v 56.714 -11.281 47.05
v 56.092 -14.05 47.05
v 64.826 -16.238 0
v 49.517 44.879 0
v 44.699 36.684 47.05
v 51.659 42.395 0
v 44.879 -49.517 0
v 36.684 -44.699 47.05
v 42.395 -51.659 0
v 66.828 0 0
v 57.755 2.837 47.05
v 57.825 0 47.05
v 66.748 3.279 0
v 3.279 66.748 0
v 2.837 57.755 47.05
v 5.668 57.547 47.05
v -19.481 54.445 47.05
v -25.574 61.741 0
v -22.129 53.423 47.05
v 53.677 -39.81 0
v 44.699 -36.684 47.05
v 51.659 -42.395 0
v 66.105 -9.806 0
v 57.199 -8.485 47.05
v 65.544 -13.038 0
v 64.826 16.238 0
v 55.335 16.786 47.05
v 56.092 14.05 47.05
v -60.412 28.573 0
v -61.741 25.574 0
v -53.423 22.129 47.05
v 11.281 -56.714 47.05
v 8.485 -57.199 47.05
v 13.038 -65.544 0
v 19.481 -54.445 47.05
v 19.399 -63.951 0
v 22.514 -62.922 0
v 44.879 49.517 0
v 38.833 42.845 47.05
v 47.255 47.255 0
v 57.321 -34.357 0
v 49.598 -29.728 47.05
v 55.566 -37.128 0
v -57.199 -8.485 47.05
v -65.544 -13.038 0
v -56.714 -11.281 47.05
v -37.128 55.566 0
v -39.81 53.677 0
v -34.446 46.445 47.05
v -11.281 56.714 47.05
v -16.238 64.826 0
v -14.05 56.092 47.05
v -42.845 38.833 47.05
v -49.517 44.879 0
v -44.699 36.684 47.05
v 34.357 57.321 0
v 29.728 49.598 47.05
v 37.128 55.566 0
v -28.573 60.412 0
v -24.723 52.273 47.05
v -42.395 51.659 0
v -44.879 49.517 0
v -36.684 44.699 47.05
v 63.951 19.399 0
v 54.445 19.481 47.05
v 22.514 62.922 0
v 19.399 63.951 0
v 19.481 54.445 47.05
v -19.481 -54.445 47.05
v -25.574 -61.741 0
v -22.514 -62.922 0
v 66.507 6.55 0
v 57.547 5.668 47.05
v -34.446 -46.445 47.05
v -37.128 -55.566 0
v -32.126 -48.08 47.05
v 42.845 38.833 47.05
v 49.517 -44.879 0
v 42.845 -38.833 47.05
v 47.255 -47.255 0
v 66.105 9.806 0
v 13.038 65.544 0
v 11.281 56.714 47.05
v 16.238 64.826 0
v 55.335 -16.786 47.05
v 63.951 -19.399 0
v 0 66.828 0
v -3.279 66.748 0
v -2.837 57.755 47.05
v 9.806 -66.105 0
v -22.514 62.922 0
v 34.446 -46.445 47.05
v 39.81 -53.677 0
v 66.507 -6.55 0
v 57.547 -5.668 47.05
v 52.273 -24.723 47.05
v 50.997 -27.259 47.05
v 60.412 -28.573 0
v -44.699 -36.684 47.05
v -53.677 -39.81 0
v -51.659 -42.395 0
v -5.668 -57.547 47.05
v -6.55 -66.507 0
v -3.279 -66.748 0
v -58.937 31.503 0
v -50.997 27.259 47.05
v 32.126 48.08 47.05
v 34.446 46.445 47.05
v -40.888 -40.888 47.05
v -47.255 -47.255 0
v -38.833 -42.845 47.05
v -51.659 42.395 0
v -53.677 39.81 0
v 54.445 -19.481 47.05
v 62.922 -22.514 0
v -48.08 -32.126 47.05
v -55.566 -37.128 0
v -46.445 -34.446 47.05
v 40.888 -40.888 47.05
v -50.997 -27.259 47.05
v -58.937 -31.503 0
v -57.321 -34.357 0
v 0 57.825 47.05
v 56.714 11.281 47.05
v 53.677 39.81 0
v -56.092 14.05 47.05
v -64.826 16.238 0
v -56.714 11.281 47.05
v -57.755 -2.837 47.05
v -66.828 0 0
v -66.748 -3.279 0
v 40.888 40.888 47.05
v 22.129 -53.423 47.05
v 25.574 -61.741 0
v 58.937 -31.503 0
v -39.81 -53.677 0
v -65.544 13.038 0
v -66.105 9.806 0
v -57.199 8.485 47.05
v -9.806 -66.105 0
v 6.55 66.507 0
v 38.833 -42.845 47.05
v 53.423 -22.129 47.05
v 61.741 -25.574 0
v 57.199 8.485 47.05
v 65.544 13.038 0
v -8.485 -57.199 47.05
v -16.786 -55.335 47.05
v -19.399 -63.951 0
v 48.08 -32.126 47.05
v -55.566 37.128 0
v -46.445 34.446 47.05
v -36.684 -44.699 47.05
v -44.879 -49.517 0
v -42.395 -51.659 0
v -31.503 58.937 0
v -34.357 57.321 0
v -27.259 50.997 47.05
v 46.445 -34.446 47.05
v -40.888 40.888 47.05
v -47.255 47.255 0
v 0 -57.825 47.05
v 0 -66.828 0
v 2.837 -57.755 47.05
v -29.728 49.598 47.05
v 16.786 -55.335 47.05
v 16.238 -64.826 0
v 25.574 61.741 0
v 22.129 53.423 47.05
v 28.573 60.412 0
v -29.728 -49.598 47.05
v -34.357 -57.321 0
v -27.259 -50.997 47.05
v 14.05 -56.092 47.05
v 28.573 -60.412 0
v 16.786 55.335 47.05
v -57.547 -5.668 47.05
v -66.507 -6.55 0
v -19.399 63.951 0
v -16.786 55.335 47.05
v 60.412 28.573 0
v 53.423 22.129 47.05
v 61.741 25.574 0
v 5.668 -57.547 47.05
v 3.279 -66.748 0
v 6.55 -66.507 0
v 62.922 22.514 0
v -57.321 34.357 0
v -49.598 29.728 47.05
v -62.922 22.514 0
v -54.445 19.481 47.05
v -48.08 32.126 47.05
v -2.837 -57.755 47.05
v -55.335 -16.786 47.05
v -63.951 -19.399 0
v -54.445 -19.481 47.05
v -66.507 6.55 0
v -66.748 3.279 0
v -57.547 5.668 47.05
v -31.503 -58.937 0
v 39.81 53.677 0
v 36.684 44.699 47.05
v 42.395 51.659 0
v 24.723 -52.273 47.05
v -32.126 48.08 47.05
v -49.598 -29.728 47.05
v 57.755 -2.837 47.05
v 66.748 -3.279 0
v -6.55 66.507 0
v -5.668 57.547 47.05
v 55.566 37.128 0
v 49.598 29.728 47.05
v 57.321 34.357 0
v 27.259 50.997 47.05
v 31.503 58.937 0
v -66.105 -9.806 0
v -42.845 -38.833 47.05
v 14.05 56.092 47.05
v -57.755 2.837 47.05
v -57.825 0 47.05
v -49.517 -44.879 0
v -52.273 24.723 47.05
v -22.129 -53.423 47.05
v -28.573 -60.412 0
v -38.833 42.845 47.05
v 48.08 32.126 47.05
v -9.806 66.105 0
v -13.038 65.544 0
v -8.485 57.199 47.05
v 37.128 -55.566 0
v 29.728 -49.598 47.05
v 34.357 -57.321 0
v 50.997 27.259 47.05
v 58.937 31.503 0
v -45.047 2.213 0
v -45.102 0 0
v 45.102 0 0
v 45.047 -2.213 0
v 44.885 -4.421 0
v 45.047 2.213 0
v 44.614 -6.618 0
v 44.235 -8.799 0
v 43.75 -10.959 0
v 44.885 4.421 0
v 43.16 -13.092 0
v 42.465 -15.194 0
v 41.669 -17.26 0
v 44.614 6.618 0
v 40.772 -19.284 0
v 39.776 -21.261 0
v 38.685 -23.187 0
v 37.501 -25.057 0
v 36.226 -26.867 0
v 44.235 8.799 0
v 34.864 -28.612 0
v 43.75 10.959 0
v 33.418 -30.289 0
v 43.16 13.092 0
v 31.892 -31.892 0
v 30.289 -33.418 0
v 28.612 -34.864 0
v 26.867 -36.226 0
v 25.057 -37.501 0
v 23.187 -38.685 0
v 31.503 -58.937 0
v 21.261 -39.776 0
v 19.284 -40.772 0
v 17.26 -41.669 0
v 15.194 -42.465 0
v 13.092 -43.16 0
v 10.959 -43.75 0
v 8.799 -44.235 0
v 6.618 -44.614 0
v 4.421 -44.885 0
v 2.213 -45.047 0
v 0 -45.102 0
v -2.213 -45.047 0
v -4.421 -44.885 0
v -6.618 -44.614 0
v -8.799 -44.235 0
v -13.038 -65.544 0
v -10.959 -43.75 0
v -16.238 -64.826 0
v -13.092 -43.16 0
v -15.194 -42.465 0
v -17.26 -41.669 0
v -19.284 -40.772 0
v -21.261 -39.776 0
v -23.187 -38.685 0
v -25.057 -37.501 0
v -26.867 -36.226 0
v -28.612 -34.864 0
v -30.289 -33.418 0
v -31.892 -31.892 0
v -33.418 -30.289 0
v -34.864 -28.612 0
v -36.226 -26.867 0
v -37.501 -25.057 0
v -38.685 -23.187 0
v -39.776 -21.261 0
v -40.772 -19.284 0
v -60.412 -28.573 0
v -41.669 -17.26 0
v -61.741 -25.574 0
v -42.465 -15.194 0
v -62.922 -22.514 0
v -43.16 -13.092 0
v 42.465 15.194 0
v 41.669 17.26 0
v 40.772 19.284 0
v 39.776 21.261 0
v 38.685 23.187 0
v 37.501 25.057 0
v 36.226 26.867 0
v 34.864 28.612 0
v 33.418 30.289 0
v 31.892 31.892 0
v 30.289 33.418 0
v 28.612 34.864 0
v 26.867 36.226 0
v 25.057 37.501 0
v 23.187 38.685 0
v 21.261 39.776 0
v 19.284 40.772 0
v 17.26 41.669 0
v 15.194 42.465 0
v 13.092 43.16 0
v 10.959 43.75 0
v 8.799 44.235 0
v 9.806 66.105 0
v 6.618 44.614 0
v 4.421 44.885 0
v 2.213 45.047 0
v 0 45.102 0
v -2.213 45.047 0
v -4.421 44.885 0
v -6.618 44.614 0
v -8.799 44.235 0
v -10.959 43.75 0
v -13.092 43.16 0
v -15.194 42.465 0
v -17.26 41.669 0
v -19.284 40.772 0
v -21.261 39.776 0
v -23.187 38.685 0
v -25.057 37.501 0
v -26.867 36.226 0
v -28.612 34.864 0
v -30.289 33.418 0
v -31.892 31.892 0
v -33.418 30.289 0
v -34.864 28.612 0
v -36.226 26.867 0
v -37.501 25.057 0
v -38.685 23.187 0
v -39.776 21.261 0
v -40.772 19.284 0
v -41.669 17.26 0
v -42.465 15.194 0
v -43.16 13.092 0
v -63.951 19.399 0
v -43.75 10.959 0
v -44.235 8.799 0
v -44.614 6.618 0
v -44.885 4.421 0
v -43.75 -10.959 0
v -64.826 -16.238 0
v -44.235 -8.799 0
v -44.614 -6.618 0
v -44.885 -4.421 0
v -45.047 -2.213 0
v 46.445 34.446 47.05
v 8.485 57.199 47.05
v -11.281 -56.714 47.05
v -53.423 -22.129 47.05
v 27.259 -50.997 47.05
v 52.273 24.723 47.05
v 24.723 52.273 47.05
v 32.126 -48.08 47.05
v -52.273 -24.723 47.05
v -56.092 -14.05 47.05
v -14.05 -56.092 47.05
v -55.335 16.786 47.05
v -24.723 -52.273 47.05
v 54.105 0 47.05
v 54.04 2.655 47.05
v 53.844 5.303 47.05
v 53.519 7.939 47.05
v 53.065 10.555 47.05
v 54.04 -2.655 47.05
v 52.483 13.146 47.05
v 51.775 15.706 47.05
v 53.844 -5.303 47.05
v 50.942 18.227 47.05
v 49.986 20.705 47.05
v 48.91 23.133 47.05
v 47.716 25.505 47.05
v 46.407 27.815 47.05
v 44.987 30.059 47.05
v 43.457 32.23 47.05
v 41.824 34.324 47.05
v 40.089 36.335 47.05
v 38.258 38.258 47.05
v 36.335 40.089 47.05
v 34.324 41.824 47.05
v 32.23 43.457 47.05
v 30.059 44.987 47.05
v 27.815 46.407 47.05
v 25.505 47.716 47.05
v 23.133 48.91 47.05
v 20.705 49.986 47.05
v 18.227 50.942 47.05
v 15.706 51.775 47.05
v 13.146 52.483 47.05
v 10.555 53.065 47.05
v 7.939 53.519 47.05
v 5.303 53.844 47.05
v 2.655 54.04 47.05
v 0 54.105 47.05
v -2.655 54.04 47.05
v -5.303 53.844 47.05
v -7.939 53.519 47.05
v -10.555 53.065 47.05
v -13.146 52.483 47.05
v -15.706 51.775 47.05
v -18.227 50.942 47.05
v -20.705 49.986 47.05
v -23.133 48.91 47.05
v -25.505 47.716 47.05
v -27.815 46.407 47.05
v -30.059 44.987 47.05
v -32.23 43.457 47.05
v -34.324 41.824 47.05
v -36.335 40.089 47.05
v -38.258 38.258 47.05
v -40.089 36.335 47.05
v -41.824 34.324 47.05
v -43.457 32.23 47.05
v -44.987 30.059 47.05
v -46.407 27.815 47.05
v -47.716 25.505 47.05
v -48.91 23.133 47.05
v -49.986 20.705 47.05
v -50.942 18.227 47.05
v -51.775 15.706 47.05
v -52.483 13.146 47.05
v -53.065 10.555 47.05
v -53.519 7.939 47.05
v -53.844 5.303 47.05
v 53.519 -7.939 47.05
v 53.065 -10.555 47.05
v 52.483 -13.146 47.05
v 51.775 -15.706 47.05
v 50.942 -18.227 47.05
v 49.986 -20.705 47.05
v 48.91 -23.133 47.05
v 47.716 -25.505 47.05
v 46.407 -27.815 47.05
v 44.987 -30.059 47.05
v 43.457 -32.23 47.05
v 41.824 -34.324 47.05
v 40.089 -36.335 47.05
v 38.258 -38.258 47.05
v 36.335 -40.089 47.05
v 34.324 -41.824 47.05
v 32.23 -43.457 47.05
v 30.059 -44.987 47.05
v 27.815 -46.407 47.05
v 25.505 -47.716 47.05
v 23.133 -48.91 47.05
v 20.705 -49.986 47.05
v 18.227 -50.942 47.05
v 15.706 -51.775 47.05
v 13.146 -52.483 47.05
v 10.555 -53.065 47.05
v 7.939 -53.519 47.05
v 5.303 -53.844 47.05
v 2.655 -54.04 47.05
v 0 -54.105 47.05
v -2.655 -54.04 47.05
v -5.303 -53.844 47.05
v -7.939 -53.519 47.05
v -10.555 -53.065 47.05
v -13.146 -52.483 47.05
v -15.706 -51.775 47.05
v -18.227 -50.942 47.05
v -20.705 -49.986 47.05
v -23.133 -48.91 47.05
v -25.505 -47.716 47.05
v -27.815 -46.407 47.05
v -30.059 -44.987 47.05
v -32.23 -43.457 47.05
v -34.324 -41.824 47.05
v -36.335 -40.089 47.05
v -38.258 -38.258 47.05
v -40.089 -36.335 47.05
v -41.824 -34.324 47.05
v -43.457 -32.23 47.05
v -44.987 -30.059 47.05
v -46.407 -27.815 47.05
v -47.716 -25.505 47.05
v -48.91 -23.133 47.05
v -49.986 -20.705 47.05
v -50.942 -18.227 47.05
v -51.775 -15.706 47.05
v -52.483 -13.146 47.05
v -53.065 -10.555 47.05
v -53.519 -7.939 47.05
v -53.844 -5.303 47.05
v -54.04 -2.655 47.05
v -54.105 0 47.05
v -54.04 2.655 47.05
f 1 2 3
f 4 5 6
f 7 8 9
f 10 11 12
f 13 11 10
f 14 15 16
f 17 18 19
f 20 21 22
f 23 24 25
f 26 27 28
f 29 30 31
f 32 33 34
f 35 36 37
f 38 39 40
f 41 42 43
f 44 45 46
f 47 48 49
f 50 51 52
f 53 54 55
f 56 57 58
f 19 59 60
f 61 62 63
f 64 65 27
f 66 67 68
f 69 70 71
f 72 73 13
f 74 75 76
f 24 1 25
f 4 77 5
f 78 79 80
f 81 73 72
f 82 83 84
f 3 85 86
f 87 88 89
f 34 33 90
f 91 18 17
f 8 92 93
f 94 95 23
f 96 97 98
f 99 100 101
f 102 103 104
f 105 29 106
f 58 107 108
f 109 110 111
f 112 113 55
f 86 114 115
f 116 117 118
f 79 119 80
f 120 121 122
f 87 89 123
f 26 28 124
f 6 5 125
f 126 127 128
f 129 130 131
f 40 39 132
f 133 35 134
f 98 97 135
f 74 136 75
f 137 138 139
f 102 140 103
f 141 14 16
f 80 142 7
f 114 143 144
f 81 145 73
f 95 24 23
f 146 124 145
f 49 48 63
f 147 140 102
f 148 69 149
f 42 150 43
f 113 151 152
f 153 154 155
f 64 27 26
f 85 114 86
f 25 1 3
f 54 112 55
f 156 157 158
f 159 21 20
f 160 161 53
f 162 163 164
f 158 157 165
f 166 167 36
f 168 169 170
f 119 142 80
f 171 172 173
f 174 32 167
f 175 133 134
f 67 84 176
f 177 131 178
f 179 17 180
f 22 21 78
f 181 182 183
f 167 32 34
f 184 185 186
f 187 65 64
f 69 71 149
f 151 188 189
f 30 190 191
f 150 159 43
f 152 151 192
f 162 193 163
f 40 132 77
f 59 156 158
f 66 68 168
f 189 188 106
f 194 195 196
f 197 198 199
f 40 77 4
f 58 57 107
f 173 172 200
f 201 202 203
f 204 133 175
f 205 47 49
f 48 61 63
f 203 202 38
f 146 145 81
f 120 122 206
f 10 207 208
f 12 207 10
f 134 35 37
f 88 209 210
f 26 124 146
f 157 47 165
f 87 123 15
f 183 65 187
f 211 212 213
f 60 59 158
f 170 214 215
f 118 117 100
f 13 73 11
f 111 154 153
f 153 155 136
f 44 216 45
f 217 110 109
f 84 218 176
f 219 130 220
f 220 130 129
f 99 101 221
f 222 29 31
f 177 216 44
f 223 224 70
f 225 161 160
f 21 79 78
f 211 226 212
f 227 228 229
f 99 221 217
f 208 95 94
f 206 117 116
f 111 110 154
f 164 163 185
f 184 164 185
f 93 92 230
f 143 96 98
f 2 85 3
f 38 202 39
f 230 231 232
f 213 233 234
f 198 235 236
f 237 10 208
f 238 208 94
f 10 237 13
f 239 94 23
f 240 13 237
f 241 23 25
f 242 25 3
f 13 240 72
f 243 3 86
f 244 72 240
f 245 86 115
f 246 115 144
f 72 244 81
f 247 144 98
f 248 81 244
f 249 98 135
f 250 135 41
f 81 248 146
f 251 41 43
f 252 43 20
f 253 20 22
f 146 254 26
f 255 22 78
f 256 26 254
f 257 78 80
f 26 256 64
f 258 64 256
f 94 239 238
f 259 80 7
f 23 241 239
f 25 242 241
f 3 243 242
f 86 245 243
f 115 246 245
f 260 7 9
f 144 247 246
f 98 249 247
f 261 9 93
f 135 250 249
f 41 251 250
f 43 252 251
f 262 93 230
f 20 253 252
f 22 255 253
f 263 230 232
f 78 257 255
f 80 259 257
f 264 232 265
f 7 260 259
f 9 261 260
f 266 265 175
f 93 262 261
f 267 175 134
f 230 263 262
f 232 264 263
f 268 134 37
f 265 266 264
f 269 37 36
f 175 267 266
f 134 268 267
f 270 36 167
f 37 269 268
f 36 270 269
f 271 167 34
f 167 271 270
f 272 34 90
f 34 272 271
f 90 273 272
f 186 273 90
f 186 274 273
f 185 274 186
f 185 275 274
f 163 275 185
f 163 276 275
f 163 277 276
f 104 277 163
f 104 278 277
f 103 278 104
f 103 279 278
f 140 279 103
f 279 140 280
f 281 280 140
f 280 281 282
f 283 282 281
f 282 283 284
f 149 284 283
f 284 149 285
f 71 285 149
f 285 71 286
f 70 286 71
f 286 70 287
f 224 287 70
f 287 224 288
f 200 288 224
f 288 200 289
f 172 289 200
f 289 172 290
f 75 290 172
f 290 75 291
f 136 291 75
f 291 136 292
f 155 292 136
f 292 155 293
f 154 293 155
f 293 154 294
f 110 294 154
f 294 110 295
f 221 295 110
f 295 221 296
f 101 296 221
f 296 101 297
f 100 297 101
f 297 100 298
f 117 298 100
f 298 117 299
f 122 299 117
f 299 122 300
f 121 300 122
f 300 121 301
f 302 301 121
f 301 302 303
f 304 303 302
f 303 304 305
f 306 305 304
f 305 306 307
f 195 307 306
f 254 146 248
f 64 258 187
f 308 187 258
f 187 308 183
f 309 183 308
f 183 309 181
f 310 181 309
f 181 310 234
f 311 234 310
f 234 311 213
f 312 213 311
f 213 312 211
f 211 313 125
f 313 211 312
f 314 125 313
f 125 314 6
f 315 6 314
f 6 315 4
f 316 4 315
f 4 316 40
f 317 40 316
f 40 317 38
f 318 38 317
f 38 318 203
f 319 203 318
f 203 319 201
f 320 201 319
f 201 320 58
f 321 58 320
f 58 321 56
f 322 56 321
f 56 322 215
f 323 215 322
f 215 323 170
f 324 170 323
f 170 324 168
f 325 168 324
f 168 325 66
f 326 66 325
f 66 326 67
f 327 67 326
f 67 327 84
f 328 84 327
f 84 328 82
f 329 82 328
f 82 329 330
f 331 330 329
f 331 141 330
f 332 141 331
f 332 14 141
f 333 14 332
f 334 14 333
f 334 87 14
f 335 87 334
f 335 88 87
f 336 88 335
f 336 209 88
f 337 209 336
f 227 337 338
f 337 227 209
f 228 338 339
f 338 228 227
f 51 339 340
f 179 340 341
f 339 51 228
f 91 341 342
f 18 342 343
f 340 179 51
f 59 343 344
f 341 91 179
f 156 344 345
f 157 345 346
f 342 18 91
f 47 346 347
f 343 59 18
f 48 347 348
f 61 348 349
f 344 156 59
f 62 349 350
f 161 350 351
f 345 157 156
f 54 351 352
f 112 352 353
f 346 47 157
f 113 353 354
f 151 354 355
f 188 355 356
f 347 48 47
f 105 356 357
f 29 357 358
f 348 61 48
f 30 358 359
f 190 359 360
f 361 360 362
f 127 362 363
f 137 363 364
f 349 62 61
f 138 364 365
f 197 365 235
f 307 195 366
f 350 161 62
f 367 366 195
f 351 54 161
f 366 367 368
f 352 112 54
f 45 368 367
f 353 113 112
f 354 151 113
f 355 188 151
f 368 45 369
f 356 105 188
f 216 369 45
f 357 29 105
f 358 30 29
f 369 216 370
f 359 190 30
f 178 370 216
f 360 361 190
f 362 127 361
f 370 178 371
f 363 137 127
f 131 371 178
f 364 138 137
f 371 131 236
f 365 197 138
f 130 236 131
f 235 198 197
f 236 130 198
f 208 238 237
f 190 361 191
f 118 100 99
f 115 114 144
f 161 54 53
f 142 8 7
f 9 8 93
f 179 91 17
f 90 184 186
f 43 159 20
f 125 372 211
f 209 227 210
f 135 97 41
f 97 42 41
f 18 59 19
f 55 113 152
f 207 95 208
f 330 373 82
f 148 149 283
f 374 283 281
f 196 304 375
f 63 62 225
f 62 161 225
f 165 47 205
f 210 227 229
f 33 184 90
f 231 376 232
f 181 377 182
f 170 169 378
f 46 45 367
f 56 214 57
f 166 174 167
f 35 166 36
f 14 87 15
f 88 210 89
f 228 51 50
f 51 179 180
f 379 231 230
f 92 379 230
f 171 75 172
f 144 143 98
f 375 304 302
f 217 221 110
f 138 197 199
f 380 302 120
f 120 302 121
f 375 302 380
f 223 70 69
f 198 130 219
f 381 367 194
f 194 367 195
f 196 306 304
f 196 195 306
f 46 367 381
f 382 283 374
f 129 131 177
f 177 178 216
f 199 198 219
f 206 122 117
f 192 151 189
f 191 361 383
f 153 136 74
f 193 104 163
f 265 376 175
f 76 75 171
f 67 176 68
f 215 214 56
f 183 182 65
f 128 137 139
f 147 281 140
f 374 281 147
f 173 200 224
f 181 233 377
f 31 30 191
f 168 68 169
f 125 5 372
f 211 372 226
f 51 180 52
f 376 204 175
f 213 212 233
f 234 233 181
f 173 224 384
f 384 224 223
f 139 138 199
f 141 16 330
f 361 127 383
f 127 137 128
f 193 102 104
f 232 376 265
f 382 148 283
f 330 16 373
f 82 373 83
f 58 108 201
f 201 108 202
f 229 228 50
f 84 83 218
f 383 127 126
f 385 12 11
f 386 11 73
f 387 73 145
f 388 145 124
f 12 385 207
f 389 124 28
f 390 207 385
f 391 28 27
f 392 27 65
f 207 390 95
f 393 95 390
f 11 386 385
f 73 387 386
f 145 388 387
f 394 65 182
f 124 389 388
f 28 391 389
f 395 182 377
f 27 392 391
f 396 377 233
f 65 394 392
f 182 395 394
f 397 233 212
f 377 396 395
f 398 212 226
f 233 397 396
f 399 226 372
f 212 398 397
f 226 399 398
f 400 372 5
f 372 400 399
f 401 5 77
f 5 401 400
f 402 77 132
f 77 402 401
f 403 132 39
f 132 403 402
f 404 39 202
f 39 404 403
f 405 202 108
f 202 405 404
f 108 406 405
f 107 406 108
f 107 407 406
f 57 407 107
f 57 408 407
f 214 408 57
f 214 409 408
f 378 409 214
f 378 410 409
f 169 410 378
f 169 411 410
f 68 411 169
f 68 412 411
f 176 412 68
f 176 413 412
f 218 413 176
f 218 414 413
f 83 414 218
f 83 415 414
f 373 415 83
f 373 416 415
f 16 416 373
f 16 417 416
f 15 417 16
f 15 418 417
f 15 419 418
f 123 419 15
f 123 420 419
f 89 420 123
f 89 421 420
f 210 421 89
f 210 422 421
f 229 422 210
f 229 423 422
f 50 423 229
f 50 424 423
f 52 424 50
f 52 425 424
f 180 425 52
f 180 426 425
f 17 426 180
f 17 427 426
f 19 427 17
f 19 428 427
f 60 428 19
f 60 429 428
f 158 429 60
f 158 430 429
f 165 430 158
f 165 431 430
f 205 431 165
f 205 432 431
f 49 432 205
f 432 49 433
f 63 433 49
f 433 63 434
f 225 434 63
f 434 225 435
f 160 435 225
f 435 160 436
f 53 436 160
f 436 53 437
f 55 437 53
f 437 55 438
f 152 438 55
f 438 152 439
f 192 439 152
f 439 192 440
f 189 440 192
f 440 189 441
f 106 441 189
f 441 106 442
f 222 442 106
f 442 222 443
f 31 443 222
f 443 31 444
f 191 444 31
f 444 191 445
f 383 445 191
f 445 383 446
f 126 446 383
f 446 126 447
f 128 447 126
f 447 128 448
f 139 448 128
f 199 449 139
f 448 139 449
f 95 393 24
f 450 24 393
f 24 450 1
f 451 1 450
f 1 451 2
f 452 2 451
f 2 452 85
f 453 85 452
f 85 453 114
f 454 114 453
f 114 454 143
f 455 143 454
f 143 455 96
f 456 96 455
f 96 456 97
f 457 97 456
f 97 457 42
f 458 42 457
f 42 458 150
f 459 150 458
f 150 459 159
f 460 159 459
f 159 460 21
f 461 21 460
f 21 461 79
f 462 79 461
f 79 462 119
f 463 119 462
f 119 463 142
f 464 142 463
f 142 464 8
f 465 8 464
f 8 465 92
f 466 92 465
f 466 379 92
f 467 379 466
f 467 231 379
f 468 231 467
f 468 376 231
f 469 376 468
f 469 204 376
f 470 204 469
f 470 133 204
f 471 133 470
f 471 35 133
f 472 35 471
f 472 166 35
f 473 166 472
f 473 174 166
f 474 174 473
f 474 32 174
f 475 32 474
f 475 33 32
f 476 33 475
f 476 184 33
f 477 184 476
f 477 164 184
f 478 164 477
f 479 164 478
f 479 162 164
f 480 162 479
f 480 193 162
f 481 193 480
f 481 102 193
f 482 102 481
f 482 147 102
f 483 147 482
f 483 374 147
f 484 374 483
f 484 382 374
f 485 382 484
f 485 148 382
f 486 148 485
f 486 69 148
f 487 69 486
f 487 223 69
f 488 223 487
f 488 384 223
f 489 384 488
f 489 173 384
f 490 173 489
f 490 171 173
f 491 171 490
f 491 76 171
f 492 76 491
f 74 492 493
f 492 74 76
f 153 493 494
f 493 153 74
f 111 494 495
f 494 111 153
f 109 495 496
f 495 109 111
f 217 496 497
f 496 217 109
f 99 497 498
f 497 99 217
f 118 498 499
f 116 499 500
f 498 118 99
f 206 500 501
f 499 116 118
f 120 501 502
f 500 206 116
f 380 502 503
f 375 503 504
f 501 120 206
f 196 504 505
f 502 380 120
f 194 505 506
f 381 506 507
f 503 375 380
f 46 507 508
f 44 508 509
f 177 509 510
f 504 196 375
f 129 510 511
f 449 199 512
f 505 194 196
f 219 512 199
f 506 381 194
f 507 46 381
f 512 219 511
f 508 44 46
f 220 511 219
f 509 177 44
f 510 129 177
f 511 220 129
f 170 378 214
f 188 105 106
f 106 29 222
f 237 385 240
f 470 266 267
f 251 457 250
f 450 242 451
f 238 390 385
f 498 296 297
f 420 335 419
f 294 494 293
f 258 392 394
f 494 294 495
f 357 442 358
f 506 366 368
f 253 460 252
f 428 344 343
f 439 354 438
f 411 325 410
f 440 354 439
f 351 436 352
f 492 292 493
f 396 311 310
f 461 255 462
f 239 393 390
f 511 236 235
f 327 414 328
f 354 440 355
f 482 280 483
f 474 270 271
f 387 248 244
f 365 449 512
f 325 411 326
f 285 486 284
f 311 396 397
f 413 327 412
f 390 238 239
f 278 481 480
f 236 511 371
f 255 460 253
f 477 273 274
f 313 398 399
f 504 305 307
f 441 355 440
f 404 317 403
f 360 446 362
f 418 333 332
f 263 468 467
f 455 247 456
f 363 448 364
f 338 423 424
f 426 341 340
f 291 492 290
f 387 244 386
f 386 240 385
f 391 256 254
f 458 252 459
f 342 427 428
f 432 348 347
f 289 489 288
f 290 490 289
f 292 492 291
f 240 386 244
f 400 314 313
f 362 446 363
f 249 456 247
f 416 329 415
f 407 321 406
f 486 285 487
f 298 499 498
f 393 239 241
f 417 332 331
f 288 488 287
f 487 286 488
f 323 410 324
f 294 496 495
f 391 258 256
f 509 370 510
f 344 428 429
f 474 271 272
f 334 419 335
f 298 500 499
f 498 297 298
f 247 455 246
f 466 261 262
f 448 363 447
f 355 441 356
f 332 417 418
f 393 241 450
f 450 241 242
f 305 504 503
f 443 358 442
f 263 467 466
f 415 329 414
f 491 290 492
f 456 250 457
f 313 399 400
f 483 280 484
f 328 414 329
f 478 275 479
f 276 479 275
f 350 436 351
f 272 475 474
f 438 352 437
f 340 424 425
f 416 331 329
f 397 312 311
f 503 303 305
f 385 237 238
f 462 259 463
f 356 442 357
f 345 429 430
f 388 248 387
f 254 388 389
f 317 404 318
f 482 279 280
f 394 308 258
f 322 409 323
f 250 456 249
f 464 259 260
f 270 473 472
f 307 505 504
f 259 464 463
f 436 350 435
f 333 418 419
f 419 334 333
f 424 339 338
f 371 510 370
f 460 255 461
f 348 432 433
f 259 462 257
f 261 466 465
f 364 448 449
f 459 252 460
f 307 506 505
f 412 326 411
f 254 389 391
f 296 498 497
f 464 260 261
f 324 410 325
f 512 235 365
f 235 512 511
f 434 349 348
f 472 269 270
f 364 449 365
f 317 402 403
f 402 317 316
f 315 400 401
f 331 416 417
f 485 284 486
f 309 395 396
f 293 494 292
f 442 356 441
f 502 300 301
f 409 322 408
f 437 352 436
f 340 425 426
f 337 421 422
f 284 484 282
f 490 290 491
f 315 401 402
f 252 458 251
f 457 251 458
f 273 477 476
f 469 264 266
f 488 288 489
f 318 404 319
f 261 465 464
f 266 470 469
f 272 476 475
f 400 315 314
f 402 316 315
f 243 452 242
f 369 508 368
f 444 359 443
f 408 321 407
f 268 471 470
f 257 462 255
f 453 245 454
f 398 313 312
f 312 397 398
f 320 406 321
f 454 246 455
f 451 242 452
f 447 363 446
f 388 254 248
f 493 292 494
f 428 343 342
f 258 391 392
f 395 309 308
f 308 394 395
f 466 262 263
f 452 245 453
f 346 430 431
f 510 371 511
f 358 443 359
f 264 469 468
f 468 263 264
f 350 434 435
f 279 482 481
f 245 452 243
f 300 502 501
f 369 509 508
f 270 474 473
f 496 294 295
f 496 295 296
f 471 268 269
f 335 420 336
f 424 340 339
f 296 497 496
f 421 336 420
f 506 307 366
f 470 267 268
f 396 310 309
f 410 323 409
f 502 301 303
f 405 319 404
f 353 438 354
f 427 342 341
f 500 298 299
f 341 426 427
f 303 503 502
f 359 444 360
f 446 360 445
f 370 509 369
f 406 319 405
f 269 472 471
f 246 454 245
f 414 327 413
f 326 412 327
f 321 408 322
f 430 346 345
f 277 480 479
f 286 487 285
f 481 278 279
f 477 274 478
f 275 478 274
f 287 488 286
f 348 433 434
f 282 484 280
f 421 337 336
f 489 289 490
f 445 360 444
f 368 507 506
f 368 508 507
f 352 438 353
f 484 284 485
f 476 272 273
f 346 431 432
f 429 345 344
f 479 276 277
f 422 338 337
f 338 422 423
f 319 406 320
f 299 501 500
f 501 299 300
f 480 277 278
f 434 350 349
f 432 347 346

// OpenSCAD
height = 47.05;
topDiameter = 107.21;
nearBottomDiameter = 91.4;
nearBottomHeight = 5.74;
lip = 4.22;
tolerance = 0.5;

module dummy() {}

nudge = 0.001;
$fn = 128;

slope = (topDiameter-nearBottomDiameter)/(height-nearBottomHeight)/2;

diff = 2*height*slope;
bottomDiameter = topDiameter - diff;

difference() {
    cylinder(d1=bottomDiameter + 2*diff + 2*lip, d2=topDiameter + 2*lip, h=height);
    translate([0,0,-nudge]) cylinder(d1=bottomDiameter + 2*tolerance, d2=topDiameter+2*tolerance, h=height+2*nudge);
}
